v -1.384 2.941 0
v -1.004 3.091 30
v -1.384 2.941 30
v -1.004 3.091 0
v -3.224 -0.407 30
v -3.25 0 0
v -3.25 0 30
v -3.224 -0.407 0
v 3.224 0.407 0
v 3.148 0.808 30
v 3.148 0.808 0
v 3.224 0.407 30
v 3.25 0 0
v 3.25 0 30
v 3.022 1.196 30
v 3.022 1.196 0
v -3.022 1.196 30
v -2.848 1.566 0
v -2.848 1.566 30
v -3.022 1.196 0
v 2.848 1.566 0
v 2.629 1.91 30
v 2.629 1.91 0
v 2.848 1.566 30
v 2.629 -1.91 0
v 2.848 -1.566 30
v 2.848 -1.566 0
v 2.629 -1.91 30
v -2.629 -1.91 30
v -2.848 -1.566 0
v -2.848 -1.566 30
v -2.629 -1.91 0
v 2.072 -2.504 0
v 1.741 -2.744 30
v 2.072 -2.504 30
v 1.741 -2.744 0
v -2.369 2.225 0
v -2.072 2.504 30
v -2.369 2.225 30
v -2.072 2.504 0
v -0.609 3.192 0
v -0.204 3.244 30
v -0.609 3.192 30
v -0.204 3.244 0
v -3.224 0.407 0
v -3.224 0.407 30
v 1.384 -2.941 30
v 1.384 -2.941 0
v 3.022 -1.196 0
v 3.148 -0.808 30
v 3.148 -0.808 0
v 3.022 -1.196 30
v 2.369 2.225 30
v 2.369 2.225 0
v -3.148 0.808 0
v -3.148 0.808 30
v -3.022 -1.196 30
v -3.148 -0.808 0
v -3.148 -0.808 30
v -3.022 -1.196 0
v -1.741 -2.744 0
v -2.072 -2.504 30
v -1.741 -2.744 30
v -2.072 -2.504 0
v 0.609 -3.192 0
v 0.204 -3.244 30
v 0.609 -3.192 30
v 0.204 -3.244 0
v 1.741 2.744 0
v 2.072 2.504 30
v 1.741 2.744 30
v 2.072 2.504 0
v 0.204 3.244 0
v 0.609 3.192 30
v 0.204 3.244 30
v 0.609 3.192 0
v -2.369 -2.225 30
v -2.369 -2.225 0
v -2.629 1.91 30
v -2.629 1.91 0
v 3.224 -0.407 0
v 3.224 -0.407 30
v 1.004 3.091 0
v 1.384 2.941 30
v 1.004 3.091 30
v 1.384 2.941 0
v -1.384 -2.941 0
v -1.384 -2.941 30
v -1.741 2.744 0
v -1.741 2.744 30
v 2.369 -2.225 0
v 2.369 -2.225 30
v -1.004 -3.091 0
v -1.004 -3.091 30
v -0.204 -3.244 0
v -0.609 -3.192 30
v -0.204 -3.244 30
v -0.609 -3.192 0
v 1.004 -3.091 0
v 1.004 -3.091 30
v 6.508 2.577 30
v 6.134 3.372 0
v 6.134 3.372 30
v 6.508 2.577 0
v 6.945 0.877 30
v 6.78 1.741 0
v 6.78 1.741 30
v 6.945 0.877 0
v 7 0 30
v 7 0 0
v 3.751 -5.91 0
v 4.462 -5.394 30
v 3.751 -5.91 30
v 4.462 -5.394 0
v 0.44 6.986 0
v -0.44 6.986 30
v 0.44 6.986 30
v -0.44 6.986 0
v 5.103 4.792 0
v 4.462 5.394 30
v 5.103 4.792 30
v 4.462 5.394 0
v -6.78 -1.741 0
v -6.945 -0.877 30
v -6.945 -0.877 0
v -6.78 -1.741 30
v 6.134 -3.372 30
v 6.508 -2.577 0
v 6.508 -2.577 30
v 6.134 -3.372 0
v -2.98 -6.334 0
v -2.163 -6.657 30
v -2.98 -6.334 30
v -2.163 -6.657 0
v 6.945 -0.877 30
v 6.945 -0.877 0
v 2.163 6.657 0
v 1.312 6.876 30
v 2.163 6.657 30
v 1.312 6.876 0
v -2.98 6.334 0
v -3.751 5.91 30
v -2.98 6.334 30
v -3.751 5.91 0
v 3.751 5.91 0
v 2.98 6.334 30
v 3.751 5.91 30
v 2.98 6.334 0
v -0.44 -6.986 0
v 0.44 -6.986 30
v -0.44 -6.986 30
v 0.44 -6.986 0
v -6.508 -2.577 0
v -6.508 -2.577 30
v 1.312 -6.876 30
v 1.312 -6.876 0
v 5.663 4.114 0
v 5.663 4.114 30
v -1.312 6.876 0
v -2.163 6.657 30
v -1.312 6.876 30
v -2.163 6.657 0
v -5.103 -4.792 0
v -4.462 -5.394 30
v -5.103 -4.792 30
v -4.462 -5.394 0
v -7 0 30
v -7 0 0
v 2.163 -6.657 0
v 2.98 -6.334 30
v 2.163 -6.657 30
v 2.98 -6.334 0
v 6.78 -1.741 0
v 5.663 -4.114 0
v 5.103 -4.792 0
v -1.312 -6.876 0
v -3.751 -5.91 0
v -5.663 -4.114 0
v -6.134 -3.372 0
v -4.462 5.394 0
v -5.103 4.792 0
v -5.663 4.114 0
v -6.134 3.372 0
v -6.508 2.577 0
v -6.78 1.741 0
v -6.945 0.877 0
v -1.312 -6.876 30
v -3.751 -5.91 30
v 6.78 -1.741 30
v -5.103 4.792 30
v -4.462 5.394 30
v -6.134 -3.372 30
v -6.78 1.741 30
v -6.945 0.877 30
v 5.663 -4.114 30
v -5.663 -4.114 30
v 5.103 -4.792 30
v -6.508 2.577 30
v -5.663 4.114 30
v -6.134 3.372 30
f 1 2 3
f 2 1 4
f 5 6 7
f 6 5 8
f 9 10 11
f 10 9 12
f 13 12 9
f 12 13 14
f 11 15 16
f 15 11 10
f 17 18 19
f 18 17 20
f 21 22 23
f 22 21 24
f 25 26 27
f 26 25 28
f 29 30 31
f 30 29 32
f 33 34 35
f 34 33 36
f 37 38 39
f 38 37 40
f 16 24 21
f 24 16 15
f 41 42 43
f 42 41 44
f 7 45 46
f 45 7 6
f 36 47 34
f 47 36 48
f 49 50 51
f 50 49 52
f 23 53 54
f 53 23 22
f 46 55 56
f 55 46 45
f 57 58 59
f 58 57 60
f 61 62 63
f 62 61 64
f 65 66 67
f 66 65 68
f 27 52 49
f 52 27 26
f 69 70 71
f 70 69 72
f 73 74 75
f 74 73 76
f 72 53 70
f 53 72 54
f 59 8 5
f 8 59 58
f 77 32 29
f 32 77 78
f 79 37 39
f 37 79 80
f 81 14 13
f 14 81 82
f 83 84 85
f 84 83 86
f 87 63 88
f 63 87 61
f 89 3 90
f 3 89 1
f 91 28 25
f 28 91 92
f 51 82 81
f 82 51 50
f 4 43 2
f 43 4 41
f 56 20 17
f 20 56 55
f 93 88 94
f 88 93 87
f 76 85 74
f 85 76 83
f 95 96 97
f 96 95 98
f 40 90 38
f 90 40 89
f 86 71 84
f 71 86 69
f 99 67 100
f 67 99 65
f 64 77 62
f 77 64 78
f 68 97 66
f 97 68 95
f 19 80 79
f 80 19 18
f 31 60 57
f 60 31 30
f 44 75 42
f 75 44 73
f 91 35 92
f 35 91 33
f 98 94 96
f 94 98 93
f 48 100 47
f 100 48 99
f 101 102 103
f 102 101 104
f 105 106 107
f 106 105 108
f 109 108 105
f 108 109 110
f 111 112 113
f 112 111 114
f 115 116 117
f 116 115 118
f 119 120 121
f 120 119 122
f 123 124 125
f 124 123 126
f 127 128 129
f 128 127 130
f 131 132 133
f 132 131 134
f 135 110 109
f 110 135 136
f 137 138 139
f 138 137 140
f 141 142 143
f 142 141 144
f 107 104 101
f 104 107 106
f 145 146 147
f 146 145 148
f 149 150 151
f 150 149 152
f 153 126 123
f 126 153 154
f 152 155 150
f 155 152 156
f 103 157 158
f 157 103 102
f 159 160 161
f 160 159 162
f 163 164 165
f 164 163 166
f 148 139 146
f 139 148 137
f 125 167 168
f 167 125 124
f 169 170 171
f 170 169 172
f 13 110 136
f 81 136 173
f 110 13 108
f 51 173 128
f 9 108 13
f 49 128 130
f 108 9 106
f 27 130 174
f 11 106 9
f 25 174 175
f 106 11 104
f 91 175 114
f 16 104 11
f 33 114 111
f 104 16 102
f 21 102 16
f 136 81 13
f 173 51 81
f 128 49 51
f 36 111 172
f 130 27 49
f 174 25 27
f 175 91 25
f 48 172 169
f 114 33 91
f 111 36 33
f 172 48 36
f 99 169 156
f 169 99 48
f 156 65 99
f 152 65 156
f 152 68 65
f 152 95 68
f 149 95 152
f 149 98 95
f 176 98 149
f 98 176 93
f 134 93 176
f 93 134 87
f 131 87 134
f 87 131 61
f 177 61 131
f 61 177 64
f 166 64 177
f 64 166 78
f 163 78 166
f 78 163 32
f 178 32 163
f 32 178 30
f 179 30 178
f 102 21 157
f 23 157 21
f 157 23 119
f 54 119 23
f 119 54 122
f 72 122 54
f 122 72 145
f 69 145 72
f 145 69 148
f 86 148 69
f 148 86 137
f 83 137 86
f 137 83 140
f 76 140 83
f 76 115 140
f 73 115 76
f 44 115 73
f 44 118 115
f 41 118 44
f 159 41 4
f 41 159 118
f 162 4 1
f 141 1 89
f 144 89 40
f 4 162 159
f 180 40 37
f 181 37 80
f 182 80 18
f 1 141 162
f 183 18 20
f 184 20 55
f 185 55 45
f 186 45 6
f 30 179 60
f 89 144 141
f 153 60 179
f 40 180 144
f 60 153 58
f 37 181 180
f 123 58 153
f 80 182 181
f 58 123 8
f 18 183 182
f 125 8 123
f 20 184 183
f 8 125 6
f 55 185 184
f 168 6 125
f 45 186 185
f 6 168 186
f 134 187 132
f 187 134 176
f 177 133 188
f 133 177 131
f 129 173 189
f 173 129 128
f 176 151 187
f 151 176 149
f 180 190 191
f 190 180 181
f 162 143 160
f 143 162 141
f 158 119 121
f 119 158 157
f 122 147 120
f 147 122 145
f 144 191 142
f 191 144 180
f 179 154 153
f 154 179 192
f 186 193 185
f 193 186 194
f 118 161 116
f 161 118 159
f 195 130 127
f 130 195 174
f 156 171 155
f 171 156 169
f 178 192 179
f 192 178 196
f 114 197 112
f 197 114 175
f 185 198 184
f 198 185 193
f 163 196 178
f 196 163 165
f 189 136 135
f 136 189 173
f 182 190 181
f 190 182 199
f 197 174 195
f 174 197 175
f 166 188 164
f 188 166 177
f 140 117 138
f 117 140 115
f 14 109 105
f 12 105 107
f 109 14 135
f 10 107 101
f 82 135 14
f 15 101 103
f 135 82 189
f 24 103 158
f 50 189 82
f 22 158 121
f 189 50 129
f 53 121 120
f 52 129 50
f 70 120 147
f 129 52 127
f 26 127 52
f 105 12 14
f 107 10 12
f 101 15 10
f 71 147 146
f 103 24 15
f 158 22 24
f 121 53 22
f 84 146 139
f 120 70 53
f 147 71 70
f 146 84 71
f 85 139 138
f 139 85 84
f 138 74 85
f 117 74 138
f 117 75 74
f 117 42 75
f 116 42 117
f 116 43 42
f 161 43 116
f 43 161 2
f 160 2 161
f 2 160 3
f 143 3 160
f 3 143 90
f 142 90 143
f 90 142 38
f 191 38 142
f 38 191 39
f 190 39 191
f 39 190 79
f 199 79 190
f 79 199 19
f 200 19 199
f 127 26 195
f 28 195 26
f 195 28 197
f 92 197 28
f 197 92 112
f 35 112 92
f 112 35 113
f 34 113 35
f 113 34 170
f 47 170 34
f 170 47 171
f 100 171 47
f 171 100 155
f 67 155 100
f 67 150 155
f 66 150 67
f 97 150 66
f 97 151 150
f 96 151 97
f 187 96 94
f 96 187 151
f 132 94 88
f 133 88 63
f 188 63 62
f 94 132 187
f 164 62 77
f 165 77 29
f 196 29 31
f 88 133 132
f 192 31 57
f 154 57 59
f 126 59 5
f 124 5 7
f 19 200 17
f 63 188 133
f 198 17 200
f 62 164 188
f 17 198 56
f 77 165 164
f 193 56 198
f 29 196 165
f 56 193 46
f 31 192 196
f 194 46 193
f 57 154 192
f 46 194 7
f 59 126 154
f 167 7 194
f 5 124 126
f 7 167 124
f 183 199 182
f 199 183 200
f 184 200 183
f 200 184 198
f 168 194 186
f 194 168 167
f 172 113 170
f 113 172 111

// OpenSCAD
$fn = 50;


difference() {
	union() {
		translate(v = [0, 0, 0]) {
			rotate(a = [0, 0, 0]) {
				cylinder(h = 30, r = 7.0000000000);
			}
		}
	}
	union() {
		translate(v = [0.0000000000, 0.0000000000, 0]) {
			rotate(a = [0, 0, 0]) {
				translate(v = [0, 0, -50]) {
					rotate(a = [0, 0, 0]) {
						cylinder(h = 100, r = 3.2500000000);
					}
				}
			}
		}
		translate(v = [0.0000000000, 0.0000000000, 0]) {
			rotate(a = [0, 0, 0]) {
				translate(v = [0, 0, -50]) {
					rotate(a = [0, 0, 0]) {
						cylinder(h = 100, r = 1.8000000000);
					}
				}
			}
		}
	}
}
